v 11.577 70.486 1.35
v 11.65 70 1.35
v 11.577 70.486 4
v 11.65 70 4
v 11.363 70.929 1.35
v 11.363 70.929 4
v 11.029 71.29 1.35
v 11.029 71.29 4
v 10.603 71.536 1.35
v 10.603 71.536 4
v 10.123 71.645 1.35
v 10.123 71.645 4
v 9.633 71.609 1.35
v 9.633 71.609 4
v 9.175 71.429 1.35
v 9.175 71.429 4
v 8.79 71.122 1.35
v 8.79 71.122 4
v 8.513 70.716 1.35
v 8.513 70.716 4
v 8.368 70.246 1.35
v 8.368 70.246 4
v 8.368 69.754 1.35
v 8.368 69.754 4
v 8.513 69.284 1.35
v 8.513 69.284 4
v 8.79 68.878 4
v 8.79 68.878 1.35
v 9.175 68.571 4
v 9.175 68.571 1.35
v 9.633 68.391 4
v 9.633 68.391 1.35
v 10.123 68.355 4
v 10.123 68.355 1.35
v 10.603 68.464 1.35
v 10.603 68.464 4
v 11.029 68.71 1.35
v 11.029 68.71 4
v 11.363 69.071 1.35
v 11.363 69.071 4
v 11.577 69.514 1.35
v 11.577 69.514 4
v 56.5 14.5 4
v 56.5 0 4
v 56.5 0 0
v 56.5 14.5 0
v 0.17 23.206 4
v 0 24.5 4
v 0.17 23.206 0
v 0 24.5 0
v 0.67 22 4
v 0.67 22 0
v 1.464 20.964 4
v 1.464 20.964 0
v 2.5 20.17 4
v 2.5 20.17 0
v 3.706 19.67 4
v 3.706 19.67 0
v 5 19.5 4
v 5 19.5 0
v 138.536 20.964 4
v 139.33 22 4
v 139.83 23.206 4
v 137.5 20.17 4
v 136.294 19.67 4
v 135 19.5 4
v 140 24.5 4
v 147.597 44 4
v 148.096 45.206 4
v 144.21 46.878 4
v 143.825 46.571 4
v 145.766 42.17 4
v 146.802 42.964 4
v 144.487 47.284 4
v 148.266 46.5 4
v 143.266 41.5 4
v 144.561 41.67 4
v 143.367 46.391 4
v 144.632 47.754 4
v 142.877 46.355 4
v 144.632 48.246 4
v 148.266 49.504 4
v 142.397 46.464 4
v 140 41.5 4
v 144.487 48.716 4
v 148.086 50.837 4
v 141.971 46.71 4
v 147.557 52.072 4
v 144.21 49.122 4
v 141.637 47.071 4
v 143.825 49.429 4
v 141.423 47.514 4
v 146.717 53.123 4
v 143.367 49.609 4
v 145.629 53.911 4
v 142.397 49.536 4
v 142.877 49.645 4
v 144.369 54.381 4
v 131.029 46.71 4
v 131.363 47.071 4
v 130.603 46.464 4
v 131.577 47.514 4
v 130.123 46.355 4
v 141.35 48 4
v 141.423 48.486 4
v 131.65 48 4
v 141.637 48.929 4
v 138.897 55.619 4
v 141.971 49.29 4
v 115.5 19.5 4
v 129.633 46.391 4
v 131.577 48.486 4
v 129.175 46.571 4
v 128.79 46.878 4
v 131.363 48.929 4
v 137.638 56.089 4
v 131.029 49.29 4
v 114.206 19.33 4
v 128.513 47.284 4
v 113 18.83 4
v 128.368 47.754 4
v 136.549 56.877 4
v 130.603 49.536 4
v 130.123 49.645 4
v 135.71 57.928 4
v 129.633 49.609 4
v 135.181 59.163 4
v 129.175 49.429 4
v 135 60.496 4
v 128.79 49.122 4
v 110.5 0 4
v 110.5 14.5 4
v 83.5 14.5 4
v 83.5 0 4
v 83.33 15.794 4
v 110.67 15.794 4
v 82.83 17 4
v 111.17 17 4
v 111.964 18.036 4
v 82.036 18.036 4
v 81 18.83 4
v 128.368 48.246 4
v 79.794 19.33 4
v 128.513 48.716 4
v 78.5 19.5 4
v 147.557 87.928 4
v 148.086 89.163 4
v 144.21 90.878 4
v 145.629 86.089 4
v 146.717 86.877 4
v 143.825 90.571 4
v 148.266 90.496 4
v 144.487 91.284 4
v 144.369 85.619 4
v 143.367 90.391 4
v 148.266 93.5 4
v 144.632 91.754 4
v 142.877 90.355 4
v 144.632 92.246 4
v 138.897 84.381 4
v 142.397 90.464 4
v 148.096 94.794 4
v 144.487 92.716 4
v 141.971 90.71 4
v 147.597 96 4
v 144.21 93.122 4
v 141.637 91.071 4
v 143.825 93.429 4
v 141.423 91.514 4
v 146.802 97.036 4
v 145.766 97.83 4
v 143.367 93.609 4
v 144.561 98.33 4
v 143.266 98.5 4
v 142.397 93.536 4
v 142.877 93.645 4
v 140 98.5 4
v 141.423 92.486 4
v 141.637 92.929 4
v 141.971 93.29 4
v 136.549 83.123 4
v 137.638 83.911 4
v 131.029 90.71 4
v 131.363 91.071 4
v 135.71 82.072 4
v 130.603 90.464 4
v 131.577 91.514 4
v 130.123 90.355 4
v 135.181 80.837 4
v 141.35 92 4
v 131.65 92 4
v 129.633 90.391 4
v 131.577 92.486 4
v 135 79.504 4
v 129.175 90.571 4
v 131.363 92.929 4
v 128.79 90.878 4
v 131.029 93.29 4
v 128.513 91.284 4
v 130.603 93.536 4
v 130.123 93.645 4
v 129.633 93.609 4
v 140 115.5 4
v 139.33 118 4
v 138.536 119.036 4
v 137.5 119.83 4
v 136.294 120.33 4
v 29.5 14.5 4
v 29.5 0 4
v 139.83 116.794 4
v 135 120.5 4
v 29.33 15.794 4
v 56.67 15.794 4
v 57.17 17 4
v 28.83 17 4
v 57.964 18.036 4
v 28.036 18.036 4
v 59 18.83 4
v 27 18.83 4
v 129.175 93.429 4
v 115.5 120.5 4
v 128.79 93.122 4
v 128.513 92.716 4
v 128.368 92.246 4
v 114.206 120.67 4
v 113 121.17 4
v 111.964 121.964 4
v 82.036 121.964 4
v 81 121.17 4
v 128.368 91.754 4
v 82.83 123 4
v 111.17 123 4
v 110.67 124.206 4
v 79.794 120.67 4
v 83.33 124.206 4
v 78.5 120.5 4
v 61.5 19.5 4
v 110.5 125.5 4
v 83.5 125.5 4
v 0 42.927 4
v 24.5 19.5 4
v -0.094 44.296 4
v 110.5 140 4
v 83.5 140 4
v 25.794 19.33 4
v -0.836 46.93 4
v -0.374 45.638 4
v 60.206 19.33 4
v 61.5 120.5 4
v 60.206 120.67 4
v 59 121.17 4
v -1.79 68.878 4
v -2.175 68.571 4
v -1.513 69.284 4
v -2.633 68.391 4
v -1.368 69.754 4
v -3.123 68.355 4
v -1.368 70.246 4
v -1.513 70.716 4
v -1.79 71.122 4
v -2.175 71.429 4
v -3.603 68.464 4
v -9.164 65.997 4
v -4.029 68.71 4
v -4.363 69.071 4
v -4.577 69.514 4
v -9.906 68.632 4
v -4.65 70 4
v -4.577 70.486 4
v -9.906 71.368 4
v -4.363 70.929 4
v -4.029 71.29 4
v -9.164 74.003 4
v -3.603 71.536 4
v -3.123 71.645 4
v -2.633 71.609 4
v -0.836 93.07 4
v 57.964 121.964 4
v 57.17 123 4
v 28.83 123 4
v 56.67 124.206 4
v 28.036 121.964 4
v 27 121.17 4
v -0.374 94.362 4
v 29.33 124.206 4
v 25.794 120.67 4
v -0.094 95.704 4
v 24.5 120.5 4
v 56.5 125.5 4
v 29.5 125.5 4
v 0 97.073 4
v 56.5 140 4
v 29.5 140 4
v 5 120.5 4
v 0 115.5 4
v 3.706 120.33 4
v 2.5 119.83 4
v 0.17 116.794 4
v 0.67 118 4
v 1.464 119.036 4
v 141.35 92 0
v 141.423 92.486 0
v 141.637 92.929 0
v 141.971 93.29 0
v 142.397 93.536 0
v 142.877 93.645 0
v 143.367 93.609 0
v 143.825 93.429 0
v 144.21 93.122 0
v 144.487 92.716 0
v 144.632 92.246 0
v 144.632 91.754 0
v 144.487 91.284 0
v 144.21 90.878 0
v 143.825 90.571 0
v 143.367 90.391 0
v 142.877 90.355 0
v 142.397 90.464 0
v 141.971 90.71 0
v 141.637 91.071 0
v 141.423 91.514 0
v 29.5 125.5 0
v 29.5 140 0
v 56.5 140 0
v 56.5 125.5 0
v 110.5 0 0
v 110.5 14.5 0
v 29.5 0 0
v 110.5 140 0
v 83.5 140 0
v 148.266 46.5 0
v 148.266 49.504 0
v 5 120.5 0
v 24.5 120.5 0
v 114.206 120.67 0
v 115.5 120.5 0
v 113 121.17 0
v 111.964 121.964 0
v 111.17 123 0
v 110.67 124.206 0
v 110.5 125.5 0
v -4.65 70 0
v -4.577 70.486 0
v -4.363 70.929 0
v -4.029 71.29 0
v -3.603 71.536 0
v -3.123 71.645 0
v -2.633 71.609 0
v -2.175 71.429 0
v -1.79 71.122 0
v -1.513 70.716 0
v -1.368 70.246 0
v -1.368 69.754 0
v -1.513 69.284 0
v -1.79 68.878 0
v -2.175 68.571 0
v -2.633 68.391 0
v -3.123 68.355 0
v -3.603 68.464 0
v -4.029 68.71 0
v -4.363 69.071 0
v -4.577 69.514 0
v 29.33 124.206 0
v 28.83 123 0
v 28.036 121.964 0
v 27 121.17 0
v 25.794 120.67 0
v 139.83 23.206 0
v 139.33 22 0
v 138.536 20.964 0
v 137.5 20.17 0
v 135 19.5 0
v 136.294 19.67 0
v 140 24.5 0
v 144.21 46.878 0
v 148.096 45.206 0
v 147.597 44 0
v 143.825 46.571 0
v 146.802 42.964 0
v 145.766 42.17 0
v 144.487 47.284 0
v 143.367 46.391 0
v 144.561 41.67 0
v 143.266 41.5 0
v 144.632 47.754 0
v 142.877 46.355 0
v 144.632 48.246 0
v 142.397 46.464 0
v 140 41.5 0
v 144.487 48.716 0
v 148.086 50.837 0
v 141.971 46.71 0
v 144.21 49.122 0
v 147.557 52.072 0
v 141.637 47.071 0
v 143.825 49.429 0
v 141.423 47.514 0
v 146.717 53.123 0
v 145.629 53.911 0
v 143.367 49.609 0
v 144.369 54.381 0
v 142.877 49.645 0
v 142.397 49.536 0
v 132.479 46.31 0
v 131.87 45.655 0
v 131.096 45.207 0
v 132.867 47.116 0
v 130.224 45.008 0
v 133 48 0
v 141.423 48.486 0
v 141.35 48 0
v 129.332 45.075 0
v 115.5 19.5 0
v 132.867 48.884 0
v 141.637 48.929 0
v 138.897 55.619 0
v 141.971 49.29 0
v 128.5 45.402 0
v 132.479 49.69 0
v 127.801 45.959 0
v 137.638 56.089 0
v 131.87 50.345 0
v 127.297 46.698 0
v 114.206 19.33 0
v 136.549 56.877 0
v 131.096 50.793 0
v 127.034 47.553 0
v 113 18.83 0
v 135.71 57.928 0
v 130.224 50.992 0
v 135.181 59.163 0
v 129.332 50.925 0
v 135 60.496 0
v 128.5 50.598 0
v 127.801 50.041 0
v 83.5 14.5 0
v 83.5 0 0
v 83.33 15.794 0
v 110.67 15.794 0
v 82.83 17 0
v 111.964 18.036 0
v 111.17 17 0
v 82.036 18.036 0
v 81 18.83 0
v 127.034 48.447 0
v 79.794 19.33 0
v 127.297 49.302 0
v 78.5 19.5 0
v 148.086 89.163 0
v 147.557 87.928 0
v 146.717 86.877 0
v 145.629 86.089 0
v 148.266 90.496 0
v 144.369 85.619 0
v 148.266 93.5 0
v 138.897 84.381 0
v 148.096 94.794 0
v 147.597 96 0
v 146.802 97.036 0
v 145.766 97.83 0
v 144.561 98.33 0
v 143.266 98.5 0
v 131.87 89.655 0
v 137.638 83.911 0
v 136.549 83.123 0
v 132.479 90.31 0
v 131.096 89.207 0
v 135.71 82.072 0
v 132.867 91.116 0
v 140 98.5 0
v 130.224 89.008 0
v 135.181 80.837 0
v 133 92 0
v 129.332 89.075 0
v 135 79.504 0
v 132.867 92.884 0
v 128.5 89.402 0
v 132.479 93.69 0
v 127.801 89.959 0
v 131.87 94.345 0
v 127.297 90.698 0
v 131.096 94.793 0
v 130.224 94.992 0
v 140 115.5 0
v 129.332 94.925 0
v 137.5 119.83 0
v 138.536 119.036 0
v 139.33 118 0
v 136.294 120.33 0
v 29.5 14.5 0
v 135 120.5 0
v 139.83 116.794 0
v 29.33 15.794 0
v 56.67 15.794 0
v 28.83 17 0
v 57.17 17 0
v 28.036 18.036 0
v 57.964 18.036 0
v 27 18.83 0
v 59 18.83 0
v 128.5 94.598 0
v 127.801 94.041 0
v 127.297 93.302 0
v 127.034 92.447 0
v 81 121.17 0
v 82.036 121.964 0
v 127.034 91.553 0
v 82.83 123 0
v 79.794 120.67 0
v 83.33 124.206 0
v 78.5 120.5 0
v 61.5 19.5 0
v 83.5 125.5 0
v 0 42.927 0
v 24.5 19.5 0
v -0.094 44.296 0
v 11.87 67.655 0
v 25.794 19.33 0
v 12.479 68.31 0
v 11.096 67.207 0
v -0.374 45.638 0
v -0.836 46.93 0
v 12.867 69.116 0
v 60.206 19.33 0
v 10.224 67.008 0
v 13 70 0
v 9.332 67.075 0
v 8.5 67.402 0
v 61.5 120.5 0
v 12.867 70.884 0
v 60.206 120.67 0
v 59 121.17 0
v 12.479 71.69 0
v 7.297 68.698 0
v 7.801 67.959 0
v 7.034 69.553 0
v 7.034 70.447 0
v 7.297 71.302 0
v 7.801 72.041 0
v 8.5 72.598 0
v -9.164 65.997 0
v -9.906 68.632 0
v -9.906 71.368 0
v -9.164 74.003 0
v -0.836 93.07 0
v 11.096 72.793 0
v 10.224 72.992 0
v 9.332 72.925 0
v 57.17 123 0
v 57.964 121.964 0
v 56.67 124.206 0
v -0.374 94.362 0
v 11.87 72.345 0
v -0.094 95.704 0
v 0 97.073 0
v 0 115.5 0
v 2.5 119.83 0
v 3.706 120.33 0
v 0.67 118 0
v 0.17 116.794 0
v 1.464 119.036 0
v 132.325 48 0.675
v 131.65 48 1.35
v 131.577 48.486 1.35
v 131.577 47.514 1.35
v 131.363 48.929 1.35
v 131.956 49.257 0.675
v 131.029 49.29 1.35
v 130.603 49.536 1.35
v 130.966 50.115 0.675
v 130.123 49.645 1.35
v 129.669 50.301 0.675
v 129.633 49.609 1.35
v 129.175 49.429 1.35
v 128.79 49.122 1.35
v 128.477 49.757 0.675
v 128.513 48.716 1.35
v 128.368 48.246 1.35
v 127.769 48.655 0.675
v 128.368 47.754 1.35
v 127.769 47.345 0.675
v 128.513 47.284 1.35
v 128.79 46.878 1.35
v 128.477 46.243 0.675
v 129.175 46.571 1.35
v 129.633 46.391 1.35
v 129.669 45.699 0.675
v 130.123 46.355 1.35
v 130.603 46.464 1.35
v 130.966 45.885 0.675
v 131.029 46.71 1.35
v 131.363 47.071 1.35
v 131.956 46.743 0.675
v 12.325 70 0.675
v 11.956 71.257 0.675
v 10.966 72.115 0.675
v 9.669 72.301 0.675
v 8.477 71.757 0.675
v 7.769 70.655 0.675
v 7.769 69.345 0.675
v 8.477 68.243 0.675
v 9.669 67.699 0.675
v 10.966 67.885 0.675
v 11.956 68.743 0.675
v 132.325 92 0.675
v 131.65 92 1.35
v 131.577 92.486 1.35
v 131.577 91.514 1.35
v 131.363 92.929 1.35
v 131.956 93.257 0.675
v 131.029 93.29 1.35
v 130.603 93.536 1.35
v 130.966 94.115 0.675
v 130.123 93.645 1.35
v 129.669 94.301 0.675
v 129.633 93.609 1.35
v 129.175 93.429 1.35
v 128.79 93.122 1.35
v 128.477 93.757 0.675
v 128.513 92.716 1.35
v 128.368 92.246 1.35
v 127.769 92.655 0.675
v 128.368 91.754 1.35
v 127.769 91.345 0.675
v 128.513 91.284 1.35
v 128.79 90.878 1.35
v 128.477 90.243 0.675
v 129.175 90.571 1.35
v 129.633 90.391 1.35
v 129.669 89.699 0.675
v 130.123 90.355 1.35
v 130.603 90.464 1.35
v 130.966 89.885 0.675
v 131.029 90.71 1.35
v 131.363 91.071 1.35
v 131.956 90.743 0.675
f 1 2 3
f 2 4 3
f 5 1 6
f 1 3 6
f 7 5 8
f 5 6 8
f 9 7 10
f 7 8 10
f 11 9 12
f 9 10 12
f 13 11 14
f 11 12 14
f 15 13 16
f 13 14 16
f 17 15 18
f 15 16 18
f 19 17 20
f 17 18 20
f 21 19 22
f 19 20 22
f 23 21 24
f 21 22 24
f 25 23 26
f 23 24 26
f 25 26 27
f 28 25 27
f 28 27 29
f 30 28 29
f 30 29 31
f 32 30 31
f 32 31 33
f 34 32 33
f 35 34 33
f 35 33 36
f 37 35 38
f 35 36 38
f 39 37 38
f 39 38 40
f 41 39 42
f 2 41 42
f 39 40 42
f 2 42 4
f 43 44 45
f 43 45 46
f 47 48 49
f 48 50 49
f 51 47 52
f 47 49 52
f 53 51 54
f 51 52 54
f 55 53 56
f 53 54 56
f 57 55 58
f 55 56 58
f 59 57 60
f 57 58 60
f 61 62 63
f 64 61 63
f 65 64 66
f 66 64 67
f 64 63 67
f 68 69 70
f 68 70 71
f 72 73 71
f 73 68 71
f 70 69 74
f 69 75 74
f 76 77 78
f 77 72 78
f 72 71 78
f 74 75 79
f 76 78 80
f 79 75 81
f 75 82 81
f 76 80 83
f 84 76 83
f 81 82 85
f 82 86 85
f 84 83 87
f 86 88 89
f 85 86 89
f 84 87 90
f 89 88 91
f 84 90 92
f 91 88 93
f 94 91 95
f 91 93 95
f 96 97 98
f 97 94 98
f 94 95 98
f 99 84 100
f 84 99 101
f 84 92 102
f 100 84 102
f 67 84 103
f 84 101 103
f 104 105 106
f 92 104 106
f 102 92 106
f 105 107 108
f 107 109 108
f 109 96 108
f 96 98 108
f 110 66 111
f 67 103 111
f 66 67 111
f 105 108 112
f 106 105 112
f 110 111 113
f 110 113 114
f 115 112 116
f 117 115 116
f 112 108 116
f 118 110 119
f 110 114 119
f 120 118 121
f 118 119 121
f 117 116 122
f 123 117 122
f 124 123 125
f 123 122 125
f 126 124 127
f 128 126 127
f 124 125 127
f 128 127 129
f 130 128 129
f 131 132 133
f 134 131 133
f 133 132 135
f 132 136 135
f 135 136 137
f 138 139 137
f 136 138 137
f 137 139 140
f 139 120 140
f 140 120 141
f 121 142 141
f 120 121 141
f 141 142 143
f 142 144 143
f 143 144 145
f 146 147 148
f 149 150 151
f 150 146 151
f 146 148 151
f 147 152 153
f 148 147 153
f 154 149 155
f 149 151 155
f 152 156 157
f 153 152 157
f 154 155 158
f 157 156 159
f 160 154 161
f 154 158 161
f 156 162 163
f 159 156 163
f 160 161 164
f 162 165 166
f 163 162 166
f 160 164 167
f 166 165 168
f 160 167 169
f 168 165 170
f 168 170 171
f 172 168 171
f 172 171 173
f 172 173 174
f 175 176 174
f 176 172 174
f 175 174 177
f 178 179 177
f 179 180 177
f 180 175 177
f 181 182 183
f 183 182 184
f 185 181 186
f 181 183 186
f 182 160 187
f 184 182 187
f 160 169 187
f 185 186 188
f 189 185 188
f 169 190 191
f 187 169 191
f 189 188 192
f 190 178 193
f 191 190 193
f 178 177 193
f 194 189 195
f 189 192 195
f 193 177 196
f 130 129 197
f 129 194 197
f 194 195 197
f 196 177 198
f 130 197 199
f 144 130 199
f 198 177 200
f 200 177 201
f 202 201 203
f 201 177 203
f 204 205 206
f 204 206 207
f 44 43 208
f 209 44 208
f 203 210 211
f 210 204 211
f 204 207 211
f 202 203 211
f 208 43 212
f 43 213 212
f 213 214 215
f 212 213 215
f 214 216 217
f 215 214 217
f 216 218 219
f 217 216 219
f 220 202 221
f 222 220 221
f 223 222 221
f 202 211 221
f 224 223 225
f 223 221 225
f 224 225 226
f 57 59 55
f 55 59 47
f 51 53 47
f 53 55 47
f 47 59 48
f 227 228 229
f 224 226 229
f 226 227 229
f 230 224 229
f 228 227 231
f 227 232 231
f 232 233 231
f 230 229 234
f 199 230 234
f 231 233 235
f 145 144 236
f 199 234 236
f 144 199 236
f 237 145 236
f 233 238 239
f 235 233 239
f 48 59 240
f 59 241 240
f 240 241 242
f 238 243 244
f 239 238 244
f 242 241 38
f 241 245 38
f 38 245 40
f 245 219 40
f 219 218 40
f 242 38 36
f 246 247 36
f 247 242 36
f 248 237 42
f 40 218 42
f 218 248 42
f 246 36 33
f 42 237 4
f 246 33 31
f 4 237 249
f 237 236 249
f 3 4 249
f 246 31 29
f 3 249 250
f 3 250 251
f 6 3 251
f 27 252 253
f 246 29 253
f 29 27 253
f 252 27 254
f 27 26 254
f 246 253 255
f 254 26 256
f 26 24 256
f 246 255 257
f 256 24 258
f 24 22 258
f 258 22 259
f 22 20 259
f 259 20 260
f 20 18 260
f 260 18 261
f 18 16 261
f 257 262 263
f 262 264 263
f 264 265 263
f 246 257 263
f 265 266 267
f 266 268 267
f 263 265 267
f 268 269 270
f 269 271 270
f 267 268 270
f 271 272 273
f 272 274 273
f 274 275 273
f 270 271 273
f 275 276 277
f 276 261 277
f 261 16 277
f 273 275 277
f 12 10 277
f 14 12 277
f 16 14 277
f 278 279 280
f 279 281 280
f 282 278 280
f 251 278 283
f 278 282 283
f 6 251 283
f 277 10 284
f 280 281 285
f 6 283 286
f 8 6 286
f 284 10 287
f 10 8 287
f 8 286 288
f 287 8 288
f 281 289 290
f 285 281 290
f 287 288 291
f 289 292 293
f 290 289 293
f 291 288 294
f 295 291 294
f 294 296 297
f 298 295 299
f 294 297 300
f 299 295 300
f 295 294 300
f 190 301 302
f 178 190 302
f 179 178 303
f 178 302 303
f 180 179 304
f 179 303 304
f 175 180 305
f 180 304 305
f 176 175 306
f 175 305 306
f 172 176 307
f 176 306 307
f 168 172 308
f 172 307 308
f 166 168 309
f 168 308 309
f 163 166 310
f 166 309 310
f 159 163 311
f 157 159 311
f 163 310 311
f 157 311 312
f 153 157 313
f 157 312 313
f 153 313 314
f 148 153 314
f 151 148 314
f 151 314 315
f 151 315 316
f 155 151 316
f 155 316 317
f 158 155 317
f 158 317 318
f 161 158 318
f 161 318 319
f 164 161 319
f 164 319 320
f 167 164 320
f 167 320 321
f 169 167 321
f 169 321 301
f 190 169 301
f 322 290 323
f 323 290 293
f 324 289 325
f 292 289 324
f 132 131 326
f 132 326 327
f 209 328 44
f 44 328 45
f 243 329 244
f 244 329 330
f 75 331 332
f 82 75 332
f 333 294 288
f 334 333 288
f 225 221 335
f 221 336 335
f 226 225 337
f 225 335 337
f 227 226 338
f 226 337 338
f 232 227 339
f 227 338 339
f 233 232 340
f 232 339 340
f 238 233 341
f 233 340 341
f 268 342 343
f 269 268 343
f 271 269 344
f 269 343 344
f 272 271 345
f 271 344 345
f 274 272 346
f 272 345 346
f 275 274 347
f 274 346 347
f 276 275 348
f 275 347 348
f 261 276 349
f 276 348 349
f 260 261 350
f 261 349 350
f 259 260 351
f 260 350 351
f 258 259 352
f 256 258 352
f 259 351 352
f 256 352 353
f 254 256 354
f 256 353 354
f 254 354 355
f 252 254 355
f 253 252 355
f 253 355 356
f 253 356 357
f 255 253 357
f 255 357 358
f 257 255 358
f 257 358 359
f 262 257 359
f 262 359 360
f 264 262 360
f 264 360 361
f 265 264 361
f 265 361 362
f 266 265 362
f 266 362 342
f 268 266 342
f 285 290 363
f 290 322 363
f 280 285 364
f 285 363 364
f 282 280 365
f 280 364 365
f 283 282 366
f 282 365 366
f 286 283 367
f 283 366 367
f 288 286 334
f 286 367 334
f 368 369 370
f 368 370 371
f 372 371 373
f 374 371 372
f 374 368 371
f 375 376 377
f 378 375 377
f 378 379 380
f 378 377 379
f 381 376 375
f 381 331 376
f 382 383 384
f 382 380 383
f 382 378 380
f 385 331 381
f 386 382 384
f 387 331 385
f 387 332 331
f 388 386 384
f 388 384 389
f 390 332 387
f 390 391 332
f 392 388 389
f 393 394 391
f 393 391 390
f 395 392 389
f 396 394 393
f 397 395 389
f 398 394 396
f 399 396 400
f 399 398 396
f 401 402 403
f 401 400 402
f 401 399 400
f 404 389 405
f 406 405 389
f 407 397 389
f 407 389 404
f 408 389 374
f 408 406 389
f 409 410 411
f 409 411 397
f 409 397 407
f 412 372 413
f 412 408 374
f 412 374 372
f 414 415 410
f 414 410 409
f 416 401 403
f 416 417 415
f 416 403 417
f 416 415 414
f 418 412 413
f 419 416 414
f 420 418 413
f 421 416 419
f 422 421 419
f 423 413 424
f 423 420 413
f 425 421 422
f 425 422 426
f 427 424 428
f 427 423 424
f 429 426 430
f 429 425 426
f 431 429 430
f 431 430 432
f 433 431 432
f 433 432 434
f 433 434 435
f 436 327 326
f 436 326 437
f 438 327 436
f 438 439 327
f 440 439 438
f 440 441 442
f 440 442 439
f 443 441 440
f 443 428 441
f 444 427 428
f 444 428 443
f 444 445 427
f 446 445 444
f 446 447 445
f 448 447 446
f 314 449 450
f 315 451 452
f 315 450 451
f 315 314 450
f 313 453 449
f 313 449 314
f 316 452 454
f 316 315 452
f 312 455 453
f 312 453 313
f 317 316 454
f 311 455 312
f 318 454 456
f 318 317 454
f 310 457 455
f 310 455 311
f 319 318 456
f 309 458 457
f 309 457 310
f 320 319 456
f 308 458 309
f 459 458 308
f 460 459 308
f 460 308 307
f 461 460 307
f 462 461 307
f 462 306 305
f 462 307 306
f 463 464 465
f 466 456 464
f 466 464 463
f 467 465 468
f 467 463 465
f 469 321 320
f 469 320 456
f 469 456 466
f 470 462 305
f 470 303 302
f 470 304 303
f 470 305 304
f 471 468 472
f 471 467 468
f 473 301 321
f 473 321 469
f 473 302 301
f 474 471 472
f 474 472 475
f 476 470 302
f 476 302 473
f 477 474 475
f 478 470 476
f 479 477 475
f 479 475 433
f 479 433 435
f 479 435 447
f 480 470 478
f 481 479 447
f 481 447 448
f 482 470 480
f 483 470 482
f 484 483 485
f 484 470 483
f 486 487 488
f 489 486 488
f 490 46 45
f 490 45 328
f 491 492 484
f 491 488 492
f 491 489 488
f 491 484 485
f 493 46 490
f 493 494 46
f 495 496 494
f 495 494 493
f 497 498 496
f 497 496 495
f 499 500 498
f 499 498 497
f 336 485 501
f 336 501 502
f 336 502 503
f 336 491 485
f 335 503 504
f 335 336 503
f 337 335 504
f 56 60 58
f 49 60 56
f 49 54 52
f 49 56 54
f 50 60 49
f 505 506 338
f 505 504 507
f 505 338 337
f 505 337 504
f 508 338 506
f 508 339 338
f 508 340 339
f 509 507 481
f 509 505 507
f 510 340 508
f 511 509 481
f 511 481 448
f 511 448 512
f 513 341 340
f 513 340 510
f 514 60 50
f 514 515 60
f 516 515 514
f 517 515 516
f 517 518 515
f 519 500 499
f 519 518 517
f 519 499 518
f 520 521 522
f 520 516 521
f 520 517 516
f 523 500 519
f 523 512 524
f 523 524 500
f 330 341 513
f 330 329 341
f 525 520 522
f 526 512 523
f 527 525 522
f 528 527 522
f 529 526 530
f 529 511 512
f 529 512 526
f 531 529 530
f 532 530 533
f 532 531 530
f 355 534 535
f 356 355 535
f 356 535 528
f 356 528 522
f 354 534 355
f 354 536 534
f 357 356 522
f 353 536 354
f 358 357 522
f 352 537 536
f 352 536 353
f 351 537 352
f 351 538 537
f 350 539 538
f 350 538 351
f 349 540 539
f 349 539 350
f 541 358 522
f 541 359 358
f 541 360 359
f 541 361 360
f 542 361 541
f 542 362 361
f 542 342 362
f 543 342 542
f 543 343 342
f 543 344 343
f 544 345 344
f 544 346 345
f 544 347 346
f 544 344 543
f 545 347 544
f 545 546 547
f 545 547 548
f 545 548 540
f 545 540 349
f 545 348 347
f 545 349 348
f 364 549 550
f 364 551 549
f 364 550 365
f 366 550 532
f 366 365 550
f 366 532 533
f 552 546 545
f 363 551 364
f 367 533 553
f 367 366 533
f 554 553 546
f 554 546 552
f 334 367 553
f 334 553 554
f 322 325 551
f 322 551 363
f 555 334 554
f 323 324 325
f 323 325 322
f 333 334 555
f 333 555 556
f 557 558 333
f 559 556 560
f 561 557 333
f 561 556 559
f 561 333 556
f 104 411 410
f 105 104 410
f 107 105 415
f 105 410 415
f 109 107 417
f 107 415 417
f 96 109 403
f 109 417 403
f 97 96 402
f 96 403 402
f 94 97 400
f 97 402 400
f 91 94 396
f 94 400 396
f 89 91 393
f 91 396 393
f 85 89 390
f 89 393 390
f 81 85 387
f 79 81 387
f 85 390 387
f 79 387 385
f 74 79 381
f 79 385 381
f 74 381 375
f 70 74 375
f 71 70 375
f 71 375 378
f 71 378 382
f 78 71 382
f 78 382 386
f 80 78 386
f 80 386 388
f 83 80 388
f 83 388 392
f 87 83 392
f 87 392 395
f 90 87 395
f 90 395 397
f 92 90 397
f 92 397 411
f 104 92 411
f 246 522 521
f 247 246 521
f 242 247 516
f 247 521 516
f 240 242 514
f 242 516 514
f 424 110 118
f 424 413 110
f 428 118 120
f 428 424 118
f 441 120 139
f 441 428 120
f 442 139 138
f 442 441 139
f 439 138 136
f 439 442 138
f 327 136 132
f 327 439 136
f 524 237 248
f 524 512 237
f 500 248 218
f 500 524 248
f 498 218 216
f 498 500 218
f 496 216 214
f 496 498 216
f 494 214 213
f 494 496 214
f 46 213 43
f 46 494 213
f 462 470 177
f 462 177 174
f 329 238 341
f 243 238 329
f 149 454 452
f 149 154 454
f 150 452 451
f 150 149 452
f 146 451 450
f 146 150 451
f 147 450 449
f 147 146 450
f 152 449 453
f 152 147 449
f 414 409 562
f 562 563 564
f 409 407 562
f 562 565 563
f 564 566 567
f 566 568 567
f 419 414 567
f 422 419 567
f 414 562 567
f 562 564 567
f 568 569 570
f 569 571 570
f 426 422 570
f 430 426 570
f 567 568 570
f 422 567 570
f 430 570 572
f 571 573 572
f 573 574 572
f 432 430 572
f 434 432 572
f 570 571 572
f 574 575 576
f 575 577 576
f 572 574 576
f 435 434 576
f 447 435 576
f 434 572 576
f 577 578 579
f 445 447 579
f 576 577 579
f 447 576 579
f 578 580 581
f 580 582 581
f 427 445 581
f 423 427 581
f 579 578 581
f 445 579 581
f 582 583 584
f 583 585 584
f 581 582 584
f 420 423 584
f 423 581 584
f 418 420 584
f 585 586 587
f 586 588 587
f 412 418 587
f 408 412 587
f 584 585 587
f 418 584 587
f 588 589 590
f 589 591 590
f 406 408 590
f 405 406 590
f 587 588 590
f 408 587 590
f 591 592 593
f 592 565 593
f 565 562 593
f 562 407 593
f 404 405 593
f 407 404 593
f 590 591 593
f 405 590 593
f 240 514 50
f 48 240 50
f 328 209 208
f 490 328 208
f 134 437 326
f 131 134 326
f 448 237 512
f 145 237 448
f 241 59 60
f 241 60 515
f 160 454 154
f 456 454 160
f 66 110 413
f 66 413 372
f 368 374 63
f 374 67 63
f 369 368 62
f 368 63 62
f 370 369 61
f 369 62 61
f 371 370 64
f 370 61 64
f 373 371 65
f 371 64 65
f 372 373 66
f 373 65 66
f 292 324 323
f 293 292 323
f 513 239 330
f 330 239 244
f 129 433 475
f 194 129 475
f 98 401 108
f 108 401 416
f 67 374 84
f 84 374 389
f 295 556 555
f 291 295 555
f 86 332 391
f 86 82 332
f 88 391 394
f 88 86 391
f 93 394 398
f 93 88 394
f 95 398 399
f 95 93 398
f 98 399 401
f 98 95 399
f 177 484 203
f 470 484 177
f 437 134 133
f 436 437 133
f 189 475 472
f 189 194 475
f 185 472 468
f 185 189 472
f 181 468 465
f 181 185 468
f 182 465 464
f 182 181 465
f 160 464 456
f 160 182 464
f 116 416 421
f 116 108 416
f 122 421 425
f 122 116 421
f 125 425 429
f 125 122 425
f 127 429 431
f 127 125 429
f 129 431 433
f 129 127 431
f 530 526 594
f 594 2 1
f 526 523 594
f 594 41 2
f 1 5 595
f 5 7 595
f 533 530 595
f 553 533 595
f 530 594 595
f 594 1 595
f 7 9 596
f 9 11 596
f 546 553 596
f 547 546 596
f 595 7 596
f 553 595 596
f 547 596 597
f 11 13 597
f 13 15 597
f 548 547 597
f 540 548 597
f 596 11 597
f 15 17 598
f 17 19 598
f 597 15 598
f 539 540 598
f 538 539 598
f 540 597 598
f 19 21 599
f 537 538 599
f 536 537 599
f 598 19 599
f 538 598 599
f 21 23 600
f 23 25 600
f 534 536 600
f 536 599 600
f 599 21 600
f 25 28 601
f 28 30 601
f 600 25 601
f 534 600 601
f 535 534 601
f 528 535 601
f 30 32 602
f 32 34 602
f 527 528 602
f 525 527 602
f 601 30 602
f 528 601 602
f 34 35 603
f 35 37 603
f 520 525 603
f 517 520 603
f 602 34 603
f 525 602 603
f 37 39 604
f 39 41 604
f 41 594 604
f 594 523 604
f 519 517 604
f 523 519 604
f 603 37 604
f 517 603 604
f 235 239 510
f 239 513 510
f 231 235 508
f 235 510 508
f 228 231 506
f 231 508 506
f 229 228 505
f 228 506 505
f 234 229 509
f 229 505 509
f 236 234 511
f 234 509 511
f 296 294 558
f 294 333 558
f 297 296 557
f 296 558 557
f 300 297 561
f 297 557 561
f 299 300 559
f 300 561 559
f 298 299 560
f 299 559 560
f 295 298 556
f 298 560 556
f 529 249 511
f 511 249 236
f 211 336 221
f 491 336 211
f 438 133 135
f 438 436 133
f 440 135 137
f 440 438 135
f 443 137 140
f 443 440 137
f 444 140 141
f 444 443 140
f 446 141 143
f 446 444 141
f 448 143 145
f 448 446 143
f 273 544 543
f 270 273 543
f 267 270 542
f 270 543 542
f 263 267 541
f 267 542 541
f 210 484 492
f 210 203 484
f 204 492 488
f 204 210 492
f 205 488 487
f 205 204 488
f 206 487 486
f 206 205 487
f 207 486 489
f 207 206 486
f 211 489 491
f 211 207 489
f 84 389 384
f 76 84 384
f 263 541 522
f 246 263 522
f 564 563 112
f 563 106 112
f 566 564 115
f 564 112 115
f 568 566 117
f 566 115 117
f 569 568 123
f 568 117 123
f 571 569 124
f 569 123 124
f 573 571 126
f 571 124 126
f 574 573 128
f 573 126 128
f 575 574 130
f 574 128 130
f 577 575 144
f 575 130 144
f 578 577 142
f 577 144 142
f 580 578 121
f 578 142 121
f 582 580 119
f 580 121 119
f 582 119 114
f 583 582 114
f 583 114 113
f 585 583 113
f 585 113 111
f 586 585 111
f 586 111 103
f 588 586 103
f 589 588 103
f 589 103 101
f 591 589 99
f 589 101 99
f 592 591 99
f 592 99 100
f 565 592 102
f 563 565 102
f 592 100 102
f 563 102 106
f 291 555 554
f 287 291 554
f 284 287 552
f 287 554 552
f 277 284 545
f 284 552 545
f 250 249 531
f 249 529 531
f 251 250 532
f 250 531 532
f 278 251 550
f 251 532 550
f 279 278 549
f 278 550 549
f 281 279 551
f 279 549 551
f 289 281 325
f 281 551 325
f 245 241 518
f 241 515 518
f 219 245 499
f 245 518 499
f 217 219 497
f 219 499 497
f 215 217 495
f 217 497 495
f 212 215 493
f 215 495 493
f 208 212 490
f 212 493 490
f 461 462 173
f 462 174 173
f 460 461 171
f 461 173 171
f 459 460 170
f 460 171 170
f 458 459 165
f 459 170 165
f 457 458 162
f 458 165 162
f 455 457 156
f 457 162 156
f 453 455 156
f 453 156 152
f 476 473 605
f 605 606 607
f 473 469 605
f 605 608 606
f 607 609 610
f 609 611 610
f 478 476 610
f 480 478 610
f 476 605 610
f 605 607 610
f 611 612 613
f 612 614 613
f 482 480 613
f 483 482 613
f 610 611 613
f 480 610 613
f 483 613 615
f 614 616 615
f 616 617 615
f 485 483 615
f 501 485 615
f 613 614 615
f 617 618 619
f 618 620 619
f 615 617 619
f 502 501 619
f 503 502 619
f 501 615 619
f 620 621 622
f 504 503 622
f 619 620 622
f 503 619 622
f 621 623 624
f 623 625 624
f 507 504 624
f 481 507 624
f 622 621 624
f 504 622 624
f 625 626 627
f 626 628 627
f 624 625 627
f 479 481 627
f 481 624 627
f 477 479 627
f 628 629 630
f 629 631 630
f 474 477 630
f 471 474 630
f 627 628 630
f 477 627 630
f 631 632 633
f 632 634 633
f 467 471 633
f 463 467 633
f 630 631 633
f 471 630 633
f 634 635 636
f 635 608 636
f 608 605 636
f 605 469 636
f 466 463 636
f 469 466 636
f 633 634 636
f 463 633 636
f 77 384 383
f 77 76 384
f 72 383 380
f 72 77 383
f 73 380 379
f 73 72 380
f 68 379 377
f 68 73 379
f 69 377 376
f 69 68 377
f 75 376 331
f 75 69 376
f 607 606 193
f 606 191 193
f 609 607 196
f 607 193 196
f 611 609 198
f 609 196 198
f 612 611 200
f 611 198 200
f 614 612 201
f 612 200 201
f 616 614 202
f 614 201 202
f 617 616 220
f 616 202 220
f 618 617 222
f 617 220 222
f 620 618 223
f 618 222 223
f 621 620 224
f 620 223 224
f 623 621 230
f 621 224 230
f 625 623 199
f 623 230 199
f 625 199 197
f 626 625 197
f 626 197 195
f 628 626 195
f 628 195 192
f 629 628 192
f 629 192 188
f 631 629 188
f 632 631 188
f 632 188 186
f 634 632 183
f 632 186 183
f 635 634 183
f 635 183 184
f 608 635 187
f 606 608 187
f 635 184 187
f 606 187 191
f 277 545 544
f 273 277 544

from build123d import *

# Parameters (mm, degrees)
BOSS_EXTRUDE1_DEPTH                             = 4
SKETCH3_W                                       = 29.5
SKETCH3_H                                       = 19.5
SKETCH3_W_2                                     = 27
CUT_EXTRUDE3_DEPTH                              = 195.527632999
BOSS_EXTRUDE2_DEPTH                             = 4
FILLET5_R                                       = 5
CSK_FOR_M3_FLAT_HEAD_MACHINE_SCREW1_D           = 3.3
CSK_FOR_M3_FLAT_HEAD_MACHINE_SCREW1_CSINK_D     = 6
CSK_FOR_M3_FLAT_HEAD_MACHINE_SCREW1_CSINK_ANGLE = 90
SKETCH8_R                                       = 1.65
CUT_EXTRUDE4_DEPTH                              = 204.958218206
FILLET6_R                                       = 5


with BuildPart() as part:
    # Sketch1 → Boss-Extrude1 (new body)
    with BuildSketch(Plane.XY):
        with BuildLine():
            Line((0, 0), (135, 0))
            Line((135, 0), (135, 140))
            Line((135, 140), (0, 140))
            Line((0, 140), (0, 97.072711728))
            ThreePointArc((0, 97.072711728), (-0.211219914, 95.028259617), (-0.835956887, 93.070173307))
            Line((-0.835956887, 93.070173307), (-9.164043113, 74.002538421))
            ThreePointArc((-9.164043113, 74.002538421), (-10, 70), (-9.164043113, 65.997461579))
            Line((-9.164043113, 65.997461579), (-0.835956887, 46.929826693))
            ThreePointArc((-0.835956887, 46.929826693), (-0.211219914, 44.971740383), (0, 42.927288272))
            Line((0, 42.927288272), (0, 0))
        make_face()
    extrude(amount=BOSS_EXTRUDE1_DEPTH)

    # Sketch3 → Cut-Extrude3 (cut, through all)
    with BuildSketch(Plane.XY.offset(4)):
        with Locations((14.75, 9.75)):
            Rectangle(SKETCH3_W, SKETCH3_H)
        with Locations((70, 9.75)):
            Rectangle(SKETCH3_W_2, SKETCH3_H)
        with Locations((125.25, 130.25)):
            Rectangle(SKETCH3_W, SKETCH3_H)
        with Locations((125.25, 9.75)):
            Rectangle(SKETCH3_W, SKETCH3_H)
        with Locations((14.75, 130.25)):
            Rectangle(SKETCH3_W, SKETCH3_H)
        with Locations((70, 130.25)):
            Rectangle(SKETCH3_W_2, SKETCH3_H)
    extrude(amount=-CUT_EXTRUDE3_DEPTH, mode=Mode.SUBTRACT)

    # Sketch9 → Boss-Extrude2 (add)
    with BuildSketch(Plane(origin=(0, 0, 0), x_dir=(-1, 0, 0), z_dir=(0, 0, -1))):
        Polygon((-140, 98.5), (-148.266499161, 98.5), (-148.266499161, 86.5), (-135, 83.5), (-135, 105.5), (-135, 120.5), (-140, 120.5), align=None)
        Polygon((-140, 19.5), (-140, 41.5), (-148.266499161, 41.5), (-148.266499161, 53.5), (-135, 56.5), (-135, 34.5), (-135, 19.5), align=None)
    extrude(amount=-BOSS_EXTRUDE2_DEPTH)

    # Fillet5
    fillet5_edges = [part.edges().sort_by_distance(p)[0] for p in [
        (135, 83.5, 2),
        (148.266499161, 86.5, 2),
        (148.266499161, 98.5, 2),
        (148.266499161, 41.5, 2),
        (148.266499161, 53.5, 2),
        (135, 56.5, 2),
    ]]
    fillet(fillet5_edges, radius=FILLET5_R)

    # CSK for M3 Flat Head Machine Screw1 (through all)
    with Locations(Plane(origin=(0, 0, 0), x_dir=(-1, 0, 0), z_dir=(0, 0, -1))):
        with Locations((-10, 70), (-130, 92), (-130, 48)):
            CounterSinkHole(CSK_FOR_M3_FLAT_HEAD_MACHINE_SCREW1_D / 2, CSK_FOR_M3_FLAT_HEAD_MACHINE_SCREW1_CSINK_D / 2, counter_sink_angle=CSK_FOR_M3_FLAT_HEAD_MACHINE_SCREW1_CSINK_ANGLE)

    # Sketch8 → Cut-Extrude4 (cut, through all)
    with BuildSketch(Plane(origin=(0, 0, 0), x_dir=(-1, 0, 0), z_dir=(0, 0, -1))):
        with Locations((3, 70)):
            Circle(SKETCH8_R)
        with Locations((-143, 92)):
            Circle(SKETCH8_R)
        with Locations((-143, 48)):
            Circle(SKETCH8_R)
    extrude(amount=-CUT_EXTRUDE4_DEPTH, mode=Mode.SUBTRACT)

    # Fillet6
    fillet6_edges = [part.edges().sort_by_distance(p)[0] for p in [
        (83.5, 120.5, 2),
        (56.5, 120.5, 2),
        (140, 120.5, 2),
        (140, 19.5, 2),
        (0, 19.5, 2),
        (29.5, 19.5, 2),
        (56.5, 19.5, 2),
        (83.5, 19.5, 2),
        (110.5, 19.5, 2),
        (110.5, 120.5, 2),
        (29.5, 120.5, 2),
        (0, 120.5, 2),
    ]]
    fillet(fillet6_edges, radius=FILLET6_R)


solid = part.part
